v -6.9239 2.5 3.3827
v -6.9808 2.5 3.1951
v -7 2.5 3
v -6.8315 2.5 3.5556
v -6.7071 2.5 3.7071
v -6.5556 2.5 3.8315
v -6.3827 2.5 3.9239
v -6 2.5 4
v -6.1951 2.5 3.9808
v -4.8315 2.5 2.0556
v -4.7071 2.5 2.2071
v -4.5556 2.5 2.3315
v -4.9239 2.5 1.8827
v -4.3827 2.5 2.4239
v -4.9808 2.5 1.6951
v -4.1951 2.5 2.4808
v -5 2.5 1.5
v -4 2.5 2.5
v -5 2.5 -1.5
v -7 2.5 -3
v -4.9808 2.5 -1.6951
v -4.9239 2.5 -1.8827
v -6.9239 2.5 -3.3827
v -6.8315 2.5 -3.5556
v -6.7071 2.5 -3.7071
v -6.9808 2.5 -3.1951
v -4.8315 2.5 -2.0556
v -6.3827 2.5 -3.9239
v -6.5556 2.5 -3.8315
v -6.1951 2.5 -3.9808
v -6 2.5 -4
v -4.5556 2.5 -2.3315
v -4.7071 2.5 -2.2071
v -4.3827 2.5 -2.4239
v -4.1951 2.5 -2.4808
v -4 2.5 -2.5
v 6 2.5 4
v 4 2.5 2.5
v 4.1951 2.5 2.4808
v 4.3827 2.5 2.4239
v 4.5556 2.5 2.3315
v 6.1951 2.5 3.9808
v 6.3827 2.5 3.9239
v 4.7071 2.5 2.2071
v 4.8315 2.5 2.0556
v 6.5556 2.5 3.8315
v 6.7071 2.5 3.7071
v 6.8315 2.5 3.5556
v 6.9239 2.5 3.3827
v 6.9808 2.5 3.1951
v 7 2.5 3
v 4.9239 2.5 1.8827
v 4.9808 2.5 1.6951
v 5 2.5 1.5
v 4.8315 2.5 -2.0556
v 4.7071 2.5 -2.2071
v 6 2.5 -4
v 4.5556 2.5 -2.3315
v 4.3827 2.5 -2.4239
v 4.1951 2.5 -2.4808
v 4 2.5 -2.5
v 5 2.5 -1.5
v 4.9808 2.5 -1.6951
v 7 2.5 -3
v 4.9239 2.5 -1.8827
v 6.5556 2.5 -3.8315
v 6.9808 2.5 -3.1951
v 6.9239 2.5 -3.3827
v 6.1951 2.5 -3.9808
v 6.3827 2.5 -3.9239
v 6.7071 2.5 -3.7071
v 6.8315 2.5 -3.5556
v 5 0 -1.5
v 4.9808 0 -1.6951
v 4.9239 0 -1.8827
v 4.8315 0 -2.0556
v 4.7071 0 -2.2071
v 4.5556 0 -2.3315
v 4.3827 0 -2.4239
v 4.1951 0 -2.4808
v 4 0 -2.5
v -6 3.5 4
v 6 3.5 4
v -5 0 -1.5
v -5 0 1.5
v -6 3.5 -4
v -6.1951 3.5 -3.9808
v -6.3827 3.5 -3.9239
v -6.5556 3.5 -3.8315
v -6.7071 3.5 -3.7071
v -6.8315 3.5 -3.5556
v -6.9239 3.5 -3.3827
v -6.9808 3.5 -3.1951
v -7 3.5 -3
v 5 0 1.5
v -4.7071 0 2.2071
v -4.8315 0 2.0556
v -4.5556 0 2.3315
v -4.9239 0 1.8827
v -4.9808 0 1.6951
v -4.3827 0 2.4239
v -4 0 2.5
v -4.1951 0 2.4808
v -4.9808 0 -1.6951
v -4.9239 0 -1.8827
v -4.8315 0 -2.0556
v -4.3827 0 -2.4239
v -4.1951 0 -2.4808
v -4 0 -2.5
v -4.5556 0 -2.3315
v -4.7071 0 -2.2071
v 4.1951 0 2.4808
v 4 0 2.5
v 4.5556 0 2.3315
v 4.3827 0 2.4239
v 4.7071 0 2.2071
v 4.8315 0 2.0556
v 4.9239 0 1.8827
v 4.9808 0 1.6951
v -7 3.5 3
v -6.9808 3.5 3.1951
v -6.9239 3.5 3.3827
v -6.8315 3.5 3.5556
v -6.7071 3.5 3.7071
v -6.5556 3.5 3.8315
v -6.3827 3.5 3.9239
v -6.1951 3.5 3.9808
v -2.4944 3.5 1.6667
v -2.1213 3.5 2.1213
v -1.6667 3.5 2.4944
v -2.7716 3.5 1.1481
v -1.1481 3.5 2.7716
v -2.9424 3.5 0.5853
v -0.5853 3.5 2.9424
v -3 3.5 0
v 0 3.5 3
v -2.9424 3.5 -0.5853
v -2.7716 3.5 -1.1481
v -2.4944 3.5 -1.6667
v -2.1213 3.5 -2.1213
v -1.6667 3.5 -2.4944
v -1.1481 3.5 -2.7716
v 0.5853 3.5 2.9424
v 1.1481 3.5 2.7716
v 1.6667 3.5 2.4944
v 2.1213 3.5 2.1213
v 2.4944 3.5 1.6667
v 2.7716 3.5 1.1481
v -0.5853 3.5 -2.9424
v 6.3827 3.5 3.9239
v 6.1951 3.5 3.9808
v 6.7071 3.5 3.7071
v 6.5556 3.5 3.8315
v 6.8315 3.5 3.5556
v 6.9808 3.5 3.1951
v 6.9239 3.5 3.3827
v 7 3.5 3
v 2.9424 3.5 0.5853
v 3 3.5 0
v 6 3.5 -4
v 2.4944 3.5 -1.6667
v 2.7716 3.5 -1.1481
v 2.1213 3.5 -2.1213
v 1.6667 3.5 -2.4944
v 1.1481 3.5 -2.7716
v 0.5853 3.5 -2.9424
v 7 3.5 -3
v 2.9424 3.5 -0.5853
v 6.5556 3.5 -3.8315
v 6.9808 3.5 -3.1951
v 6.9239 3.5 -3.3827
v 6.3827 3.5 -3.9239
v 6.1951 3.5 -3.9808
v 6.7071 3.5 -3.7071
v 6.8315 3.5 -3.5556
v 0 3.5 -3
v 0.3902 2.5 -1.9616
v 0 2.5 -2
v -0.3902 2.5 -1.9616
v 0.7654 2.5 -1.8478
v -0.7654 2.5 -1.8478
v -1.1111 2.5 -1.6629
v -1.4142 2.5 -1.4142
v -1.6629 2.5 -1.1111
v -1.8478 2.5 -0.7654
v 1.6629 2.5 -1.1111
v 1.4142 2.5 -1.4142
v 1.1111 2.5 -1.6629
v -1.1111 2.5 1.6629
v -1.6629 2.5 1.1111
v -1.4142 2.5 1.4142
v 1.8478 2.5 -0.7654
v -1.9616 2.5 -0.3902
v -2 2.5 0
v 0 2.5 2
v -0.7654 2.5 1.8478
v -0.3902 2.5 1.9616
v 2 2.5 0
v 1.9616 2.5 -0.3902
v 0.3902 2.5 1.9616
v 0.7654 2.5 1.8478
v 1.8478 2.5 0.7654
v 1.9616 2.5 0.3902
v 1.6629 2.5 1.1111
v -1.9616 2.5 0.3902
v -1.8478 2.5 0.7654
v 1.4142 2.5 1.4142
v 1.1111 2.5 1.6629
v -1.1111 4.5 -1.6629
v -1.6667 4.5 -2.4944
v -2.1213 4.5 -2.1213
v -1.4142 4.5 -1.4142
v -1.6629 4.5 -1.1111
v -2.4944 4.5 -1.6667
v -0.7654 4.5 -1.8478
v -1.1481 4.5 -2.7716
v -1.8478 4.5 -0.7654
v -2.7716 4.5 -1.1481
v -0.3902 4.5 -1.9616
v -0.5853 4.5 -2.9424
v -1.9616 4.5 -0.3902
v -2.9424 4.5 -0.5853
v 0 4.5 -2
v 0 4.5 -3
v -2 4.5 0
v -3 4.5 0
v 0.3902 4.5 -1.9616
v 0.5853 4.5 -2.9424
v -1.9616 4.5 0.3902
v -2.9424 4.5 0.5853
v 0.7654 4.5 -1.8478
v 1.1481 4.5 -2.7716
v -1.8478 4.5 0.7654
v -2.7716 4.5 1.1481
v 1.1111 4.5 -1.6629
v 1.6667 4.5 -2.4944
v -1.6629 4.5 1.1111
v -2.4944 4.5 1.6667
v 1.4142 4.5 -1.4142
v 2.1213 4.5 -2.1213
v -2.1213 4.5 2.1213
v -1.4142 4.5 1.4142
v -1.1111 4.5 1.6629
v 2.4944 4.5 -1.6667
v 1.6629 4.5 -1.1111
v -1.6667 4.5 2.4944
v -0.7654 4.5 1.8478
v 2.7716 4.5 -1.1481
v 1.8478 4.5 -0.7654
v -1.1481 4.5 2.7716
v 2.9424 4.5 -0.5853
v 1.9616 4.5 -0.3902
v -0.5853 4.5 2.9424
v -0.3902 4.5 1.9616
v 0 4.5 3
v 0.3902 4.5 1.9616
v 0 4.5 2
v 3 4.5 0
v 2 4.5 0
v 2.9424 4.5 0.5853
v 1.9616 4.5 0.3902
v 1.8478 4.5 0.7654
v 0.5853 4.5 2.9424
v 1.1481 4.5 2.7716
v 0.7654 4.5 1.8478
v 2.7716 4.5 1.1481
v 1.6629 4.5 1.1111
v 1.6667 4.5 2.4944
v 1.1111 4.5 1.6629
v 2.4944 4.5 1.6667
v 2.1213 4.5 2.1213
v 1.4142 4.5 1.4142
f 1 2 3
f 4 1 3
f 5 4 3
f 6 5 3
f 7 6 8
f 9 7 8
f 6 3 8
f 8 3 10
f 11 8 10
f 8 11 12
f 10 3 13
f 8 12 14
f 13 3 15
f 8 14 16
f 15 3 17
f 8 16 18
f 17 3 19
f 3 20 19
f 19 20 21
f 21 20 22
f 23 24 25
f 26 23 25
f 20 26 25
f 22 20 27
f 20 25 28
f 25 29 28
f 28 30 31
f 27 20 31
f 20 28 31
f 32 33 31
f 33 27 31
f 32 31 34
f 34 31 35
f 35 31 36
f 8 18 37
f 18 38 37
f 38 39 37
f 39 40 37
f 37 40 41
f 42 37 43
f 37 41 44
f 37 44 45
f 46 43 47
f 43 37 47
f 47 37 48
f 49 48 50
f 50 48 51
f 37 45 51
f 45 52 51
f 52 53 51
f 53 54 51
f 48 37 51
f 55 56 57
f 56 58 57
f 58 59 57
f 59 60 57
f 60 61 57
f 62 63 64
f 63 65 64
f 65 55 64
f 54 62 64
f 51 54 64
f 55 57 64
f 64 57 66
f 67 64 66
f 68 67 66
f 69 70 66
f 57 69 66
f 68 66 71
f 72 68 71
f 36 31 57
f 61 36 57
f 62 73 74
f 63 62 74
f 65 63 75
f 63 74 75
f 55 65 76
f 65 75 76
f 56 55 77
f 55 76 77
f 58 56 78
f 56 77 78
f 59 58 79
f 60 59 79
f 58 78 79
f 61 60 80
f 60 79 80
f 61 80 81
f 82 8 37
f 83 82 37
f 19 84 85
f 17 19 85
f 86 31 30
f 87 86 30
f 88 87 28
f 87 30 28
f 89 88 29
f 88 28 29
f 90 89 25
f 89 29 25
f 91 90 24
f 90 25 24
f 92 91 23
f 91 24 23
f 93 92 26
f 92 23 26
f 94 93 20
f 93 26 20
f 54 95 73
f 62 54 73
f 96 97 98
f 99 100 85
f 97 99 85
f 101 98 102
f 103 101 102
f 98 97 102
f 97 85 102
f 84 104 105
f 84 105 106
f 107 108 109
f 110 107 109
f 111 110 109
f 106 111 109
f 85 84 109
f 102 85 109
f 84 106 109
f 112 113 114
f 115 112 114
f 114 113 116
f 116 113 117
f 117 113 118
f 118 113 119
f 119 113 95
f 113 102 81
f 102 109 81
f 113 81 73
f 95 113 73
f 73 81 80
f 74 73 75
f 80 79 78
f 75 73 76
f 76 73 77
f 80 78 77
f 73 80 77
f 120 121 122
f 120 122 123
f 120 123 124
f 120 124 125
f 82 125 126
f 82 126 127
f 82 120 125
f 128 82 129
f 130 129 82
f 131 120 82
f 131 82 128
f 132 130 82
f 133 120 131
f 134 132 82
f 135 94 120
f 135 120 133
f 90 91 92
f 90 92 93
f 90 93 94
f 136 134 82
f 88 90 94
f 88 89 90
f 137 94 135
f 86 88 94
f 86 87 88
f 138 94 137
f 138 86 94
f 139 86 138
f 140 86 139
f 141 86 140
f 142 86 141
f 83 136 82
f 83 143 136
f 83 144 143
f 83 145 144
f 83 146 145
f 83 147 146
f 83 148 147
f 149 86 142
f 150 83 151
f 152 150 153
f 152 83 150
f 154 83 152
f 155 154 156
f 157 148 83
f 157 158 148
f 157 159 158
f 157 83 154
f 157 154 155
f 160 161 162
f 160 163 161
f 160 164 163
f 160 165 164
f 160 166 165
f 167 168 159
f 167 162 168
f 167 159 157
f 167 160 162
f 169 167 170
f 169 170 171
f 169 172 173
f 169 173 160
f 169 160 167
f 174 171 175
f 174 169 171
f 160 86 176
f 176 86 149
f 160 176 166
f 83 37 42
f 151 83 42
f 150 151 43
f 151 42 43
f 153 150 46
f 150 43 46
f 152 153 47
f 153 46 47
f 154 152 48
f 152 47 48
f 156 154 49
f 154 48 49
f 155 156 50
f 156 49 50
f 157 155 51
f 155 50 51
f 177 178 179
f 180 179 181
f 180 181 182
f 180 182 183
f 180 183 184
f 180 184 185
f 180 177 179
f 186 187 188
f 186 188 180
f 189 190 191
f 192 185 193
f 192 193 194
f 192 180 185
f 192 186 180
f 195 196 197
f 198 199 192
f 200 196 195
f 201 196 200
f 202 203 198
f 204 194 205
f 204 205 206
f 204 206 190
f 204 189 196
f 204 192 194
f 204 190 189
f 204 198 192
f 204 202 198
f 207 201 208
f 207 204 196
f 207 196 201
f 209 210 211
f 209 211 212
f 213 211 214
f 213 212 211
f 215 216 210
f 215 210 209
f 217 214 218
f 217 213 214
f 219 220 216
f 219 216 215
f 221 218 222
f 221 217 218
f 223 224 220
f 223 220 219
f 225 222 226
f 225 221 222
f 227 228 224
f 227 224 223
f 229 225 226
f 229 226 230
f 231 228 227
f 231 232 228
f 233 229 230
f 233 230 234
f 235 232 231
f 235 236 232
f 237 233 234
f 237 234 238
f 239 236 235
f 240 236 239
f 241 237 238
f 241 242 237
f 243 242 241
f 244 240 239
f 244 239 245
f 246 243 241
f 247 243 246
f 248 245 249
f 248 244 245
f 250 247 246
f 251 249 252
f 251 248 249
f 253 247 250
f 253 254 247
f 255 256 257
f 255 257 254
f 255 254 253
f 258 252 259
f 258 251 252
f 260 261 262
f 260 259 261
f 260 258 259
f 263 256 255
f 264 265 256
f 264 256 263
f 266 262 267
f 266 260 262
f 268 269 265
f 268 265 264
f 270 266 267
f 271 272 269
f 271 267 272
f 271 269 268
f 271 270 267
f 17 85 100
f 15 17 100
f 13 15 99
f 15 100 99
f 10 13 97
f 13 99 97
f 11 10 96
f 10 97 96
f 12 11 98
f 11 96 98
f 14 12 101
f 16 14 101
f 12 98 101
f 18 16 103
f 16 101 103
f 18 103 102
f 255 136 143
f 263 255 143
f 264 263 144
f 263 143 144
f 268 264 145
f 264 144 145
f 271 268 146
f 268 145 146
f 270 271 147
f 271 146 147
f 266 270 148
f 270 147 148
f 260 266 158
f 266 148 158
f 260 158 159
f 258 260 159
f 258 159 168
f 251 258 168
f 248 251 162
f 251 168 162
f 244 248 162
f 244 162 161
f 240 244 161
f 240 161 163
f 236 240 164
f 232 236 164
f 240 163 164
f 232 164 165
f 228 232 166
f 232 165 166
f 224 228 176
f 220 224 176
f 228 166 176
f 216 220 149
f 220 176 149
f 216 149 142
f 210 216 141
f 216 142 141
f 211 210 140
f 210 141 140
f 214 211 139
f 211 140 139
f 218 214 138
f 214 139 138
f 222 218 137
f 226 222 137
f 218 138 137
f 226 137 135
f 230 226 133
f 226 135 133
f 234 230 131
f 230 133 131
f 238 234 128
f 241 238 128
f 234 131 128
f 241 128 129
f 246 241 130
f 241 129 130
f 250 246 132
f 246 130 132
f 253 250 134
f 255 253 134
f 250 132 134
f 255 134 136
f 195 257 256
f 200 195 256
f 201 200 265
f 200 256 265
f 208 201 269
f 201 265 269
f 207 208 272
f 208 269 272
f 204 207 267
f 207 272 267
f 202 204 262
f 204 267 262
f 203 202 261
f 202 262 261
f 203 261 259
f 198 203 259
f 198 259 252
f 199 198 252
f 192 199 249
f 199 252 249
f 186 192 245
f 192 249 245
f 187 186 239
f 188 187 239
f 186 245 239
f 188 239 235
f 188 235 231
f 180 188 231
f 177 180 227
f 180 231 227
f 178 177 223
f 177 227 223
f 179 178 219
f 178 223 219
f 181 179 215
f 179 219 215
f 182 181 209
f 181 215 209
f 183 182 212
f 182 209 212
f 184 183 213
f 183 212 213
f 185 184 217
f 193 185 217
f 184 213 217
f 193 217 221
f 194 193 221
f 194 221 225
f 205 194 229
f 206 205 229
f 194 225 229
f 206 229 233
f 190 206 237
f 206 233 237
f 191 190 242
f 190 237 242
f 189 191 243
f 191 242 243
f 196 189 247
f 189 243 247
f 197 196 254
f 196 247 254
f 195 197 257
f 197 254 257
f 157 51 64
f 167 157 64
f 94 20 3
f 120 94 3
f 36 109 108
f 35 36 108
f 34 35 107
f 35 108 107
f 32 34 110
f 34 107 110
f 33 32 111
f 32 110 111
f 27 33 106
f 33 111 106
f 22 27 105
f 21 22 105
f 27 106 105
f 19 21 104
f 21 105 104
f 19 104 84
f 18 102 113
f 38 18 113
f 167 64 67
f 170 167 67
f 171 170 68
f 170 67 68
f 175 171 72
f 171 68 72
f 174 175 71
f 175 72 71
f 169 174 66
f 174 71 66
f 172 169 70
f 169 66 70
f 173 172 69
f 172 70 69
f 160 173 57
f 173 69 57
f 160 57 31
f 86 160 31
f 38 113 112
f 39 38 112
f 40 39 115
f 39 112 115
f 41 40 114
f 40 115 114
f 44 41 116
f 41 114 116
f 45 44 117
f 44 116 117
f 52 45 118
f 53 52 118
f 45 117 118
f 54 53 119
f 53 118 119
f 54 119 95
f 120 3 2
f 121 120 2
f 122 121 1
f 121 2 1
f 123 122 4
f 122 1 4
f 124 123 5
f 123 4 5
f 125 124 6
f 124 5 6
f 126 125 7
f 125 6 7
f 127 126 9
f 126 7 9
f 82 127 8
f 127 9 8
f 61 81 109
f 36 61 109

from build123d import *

# Parameters (mm, degrees)
SALIENTE_EXTRUIR1_DEPTH = 2.5
SALIENTE_EXTRUIR2_DEPTH = 1
CROQUIS3_R              = 3
SALIENTE_EXTRUIR3_DEPTH = 1
CROQUIS4_R              = 2
CORTAR_EXTRUIR1_DEPTH   = 2


with BuildPart() as part:
    # Croquis1 → Saliente-Extruir1 (new body)
    with BuildSketch(Plane(origin=(0, 0, 0), x_dir=(1, 0, 0), z_dir=(0, 1, 0))):
        with BuildLine():
            Line((-4, -2.5), (4, -2.5))
            ThreePointArc((4, -2.5), (4.707106781, -2.207106781), (5, -1.5))
            Line((5, -1.5), (5, 1.5))
            ThreePointArc((5, 1.5), (4.707106781, 2.207106781), (4, 2.5))
            Line((4, 2.5), (-4, 2.5))
            ThreePointArc((-4, 2.5), (-4.707106781, 2.207106781), (-5, 1.5))
            Line((-5, 1.5), (-5, -1.5))
            ThreePointArc((-5, -1.5), (-4.707106781, -2.207106781), (-4, -2.5))
        make_face()
    extrude(amount=SALIENTE_EXTRUIR1_DEPTH)

    # Croquis2 → Saliente-Extruir2 (add)
    with BuildSketch(Plane(origin=(0, 2.5, 0), x_dir=(1, 0, 0), z_dir=(0, 1, 0))):
        with BuildLine():
            Line((-6, -4), (6, -4))
            ThreePointArc((6, -4), (6.707106781, -3.707106781), (7, -3))
            Line((7, -3), (7, 3))
            ThreePointArc((7, 3), (6.707106781, 3.707106781), (6, 4))
            Line((6, 4), (-6, 4))
            ThreePointArc((-6, 4), (-6.707106781, 3.707106781), (-7, 3))
            Line((-7, 3), (-7, -3))
            ThreePointArc((-7, -3), (-6.707106781, -3.707106781), (-6, -4))
        make_face()
    extrude(amount=SALIENTE_EXTRUIR2_DEPTH)

    # Croquis3 → Saliente-Extruir3 (add)
    with BuildSketch(Plane(origin=(0, 3.5, 0), x_dir=(1, 0, 0), z_dir=(0, 1, 0))):
        with Locations(Location((0, 0, 0), (0, 0, 270))):
            Circle(CROQUIS3_R)
    extrude(amount=SALIENTE_EXTRUIR3_DEPTH)

    # Croquis4 → Cortar-Extruir1 (cut)
    with BuildSketch(Plane(origin=(0, 4.5, 0), x_dir=(1, 0, 0), z_dir=(0, 1, 0))):
        with Locations(Location((0, 0, 0), (0, 0, 270))):
            Circle(CROQUIS4_R)
    extrude(amount=-CORTAR_EXTRUIR1_DEPTH, mode=Mode.SUBTRACT)


solid = part.part
